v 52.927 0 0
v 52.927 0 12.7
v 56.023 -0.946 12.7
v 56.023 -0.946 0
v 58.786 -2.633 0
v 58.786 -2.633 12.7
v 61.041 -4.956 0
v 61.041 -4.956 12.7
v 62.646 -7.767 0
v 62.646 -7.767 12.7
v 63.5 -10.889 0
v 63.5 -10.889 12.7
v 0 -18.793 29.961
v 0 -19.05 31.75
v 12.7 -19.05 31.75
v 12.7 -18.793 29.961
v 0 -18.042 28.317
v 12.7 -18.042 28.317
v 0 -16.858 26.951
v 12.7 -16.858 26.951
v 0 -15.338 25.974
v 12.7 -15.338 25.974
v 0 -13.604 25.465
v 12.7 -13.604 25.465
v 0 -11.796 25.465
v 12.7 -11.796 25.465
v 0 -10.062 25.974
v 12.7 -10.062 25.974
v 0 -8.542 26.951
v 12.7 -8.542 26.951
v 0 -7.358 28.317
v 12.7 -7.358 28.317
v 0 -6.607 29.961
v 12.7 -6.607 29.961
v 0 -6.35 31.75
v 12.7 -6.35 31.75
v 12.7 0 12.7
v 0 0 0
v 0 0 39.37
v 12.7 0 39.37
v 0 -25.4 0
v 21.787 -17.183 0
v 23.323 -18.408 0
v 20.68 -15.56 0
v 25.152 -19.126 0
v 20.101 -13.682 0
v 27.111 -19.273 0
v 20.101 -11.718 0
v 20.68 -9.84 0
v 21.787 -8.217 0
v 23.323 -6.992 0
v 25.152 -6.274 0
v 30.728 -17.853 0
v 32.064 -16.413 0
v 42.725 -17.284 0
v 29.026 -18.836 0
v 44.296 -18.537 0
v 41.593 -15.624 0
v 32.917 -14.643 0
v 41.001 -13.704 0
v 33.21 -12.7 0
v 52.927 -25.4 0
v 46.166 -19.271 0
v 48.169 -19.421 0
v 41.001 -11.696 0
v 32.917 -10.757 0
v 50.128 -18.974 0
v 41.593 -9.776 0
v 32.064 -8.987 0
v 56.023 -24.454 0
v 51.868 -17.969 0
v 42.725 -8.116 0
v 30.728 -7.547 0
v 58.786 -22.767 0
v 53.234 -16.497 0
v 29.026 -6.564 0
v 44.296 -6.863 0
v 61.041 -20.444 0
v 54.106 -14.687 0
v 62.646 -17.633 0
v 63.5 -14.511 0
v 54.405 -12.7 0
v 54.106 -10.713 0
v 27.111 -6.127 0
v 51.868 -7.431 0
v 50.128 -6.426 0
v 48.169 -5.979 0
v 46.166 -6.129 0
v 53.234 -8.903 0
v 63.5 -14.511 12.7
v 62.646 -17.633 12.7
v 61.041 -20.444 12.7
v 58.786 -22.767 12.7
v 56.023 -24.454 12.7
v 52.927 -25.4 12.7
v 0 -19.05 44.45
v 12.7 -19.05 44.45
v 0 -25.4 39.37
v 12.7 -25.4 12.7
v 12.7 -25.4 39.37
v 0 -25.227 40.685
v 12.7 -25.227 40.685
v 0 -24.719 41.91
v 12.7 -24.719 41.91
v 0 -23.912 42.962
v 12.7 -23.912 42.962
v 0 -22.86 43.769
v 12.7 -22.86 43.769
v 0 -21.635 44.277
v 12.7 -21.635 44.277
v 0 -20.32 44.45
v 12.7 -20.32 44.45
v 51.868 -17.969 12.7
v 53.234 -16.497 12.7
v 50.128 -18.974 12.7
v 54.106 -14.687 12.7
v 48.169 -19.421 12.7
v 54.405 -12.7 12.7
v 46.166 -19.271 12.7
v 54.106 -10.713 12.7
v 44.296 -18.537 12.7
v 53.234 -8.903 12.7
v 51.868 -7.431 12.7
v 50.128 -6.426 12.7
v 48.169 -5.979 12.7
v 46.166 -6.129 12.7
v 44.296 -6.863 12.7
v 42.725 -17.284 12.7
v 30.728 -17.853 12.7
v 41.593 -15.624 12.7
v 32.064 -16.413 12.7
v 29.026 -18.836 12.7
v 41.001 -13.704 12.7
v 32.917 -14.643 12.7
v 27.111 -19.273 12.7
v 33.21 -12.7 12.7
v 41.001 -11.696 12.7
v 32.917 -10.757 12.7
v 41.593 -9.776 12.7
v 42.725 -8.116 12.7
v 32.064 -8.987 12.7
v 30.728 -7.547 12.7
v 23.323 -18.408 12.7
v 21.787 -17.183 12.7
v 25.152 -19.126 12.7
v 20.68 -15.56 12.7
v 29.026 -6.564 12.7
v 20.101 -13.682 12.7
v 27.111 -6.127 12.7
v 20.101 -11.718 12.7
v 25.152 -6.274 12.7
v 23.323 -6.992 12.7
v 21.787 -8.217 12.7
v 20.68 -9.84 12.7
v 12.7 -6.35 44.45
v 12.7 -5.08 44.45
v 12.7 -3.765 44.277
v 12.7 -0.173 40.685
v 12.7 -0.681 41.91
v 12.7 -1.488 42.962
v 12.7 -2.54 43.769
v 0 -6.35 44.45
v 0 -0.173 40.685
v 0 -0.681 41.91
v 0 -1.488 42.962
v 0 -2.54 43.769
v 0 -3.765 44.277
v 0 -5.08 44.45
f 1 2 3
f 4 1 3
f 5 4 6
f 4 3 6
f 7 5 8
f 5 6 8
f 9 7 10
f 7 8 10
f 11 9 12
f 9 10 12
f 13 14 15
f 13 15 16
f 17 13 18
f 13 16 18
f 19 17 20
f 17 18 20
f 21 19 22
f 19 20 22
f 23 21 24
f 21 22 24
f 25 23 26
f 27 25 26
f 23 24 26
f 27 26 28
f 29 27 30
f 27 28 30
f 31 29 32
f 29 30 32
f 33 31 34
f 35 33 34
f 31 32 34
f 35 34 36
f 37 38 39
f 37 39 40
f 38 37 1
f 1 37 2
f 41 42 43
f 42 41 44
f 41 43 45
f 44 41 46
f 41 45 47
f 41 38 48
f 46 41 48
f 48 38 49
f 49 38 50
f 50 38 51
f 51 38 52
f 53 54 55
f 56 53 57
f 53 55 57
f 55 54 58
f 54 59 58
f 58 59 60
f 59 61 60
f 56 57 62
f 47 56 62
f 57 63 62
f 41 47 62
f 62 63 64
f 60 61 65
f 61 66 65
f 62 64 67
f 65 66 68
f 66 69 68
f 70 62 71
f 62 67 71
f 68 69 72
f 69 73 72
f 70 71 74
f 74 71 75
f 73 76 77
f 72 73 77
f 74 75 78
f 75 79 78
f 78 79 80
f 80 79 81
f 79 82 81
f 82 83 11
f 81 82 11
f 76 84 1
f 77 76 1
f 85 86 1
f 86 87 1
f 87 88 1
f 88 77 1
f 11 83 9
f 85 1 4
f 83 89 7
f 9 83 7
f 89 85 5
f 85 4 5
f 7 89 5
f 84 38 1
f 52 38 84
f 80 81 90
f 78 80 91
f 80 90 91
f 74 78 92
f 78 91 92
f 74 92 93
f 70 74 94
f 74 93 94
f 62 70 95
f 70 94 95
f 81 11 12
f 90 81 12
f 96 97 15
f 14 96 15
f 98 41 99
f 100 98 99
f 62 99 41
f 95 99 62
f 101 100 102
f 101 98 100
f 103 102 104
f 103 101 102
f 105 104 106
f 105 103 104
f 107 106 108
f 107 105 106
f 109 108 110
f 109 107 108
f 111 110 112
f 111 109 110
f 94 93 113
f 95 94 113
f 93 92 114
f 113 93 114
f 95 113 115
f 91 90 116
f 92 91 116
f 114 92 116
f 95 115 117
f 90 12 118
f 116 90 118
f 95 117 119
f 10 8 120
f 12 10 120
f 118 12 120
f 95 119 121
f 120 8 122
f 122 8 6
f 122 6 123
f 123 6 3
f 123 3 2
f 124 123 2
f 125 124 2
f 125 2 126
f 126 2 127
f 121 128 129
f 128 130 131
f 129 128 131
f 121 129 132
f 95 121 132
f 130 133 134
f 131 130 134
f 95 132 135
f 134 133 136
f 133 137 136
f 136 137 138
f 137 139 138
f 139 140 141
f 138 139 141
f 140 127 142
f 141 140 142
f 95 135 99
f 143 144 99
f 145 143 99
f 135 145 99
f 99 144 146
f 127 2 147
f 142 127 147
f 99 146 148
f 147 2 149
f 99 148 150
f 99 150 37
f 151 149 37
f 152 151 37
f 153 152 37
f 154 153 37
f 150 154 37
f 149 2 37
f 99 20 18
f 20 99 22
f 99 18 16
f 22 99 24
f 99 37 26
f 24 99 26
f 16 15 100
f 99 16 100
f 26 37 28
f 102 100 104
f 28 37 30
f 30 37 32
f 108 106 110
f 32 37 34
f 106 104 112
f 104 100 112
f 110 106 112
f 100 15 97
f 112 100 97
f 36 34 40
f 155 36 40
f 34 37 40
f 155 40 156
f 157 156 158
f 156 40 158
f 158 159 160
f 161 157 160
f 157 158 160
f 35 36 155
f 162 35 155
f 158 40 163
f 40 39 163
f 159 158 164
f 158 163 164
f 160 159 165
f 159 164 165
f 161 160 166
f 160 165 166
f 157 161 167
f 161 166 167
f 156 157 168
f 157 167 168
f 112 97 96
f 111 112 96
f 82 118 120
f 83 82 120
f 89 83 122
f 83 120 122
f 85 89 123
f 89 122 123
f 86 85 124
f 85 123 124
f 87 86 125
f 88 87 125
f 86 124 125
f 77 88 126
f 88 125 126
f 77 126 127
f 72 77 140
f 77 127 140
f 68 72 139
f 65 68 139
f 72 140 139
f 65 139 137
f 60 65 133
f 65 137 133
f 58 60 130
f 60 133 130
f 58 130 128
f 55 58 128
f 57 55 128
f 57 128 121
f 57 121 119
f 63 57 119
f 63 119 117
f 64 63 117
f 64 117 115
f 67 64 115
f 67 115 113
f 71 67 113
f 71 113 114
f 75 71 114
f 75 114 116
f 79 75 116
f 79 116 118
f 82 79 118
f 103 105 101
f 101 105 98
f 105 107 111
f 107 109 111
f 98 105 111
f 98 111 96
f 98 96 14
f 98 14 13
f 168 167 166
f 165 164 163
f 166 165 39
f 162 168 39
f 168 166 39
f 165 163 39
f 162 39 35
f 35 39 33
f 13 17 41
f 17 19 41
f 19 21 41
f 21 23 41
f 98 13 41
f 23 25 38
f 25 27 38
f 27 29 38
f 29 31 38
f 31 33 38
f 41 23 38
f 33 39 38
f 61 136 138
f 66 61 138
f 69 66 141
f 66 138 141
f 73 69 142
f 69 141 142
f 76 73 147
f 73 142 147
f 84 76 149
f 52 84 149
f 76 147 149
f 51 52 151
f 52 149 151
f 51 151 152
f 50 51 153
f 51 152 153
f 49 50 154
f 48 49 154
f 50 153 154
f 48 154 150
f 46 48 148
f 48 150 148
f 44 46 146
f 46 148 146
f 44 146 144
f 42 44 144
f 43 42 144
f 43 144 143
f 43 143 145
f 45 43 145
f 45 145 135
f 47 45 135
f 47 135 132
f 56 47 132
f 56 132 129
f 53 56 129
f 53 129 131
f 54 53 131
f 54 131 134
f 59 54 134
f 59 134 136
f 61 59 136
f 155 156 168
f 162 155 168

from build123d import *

# Parameters (mm, degrees)
F1_DEPTH = 25.4
F3_DEPTH = 25.4
F4_R     = 6.591123
F4_R_2   = 6.739643
F5_DEPTH = 25.4
F7_DEPTH = 25.4
F8_R     = 5.08
F9_R     = 5.08


with BuildPart() as f1:
    # F0 (on Front) → F1 (new body)
    with BuildSketch(Plane.XZ):
        Polygon((12.7, 44.45), (0, 44.45), (0, 0), (63.5, 0), (63.5, 12.7), (12.7, 12.7), align=None)
    extrude(amount=F1_DEPTH)

    # F2 (on face) → F3 (cut)
    with BuildSketch(Plane.XY.offset(12.7)):
        with BuildLine():
            ThreePointArc((63.5, -14.510555), (59.986844, -21.676886), (52.927312, -25.4))
            Line((52.927312, -25.4), (63.5, -25.4))
            Line((63.5, -25.4), (63.5, -14.510555))
        make_face()
        with BuildLine():
            ThreePointArc((52.927312, 0), (59.986844, -3.723114), (63.5, -10.889445))
            Line((63.5, -10.889445), (63.5, 0))
            Line((63.5, 0), (52.927312, 0))
        make_face()
    extrude(amount=-F3_DEPTH, mode=Mode.SUBTRACT)

    # F4 (on face) → F5 (cut)
    with BuildSketch(Plane.XY.offset(12.7)):
        with Locations((26.618414, -12.7)):
            Circle(F4_R)
        with Locations((47.665533, -12.7)):
            Circle(F4_R_2)
    extrude(amount=-F5_DEPTH, mode=Mode.SUBTRACT)

    # F6 (on face) → F7 (cut)
    with BuildSketch(Plane.YZ.offset(12.7)):
        with BuildLine():
            ThreePointArc((-19.05, 31.75), (-12.7, 25.4), (-6.35, 31.75))
            Line((-6.35, 31.75), (-6.35, 44.45))
            Line((-6.35, 44.45), (-19.05, 44.45))
            Line((-19.05, 44.45), (-19.05, 31.75))
        make_face()
    extrude(amount=-F7_DEPTH, mode=Mode.SUBTRACT)

    # F8
    f8_edges = [f1.edges().sort_by_distance(p)[0] for p in [
        (6.35, -25.4, 44.45),
    ]]
    fillet(f8_edges, radius=F8_R)

    # F9
    f9_edges = [f1.edges().sort_by_distance(p)[0] for p in [
        (6.35, 0, 44.45),
    ]]
    fillet(f9_edges, radius=F9_R)


solid = f1.part
